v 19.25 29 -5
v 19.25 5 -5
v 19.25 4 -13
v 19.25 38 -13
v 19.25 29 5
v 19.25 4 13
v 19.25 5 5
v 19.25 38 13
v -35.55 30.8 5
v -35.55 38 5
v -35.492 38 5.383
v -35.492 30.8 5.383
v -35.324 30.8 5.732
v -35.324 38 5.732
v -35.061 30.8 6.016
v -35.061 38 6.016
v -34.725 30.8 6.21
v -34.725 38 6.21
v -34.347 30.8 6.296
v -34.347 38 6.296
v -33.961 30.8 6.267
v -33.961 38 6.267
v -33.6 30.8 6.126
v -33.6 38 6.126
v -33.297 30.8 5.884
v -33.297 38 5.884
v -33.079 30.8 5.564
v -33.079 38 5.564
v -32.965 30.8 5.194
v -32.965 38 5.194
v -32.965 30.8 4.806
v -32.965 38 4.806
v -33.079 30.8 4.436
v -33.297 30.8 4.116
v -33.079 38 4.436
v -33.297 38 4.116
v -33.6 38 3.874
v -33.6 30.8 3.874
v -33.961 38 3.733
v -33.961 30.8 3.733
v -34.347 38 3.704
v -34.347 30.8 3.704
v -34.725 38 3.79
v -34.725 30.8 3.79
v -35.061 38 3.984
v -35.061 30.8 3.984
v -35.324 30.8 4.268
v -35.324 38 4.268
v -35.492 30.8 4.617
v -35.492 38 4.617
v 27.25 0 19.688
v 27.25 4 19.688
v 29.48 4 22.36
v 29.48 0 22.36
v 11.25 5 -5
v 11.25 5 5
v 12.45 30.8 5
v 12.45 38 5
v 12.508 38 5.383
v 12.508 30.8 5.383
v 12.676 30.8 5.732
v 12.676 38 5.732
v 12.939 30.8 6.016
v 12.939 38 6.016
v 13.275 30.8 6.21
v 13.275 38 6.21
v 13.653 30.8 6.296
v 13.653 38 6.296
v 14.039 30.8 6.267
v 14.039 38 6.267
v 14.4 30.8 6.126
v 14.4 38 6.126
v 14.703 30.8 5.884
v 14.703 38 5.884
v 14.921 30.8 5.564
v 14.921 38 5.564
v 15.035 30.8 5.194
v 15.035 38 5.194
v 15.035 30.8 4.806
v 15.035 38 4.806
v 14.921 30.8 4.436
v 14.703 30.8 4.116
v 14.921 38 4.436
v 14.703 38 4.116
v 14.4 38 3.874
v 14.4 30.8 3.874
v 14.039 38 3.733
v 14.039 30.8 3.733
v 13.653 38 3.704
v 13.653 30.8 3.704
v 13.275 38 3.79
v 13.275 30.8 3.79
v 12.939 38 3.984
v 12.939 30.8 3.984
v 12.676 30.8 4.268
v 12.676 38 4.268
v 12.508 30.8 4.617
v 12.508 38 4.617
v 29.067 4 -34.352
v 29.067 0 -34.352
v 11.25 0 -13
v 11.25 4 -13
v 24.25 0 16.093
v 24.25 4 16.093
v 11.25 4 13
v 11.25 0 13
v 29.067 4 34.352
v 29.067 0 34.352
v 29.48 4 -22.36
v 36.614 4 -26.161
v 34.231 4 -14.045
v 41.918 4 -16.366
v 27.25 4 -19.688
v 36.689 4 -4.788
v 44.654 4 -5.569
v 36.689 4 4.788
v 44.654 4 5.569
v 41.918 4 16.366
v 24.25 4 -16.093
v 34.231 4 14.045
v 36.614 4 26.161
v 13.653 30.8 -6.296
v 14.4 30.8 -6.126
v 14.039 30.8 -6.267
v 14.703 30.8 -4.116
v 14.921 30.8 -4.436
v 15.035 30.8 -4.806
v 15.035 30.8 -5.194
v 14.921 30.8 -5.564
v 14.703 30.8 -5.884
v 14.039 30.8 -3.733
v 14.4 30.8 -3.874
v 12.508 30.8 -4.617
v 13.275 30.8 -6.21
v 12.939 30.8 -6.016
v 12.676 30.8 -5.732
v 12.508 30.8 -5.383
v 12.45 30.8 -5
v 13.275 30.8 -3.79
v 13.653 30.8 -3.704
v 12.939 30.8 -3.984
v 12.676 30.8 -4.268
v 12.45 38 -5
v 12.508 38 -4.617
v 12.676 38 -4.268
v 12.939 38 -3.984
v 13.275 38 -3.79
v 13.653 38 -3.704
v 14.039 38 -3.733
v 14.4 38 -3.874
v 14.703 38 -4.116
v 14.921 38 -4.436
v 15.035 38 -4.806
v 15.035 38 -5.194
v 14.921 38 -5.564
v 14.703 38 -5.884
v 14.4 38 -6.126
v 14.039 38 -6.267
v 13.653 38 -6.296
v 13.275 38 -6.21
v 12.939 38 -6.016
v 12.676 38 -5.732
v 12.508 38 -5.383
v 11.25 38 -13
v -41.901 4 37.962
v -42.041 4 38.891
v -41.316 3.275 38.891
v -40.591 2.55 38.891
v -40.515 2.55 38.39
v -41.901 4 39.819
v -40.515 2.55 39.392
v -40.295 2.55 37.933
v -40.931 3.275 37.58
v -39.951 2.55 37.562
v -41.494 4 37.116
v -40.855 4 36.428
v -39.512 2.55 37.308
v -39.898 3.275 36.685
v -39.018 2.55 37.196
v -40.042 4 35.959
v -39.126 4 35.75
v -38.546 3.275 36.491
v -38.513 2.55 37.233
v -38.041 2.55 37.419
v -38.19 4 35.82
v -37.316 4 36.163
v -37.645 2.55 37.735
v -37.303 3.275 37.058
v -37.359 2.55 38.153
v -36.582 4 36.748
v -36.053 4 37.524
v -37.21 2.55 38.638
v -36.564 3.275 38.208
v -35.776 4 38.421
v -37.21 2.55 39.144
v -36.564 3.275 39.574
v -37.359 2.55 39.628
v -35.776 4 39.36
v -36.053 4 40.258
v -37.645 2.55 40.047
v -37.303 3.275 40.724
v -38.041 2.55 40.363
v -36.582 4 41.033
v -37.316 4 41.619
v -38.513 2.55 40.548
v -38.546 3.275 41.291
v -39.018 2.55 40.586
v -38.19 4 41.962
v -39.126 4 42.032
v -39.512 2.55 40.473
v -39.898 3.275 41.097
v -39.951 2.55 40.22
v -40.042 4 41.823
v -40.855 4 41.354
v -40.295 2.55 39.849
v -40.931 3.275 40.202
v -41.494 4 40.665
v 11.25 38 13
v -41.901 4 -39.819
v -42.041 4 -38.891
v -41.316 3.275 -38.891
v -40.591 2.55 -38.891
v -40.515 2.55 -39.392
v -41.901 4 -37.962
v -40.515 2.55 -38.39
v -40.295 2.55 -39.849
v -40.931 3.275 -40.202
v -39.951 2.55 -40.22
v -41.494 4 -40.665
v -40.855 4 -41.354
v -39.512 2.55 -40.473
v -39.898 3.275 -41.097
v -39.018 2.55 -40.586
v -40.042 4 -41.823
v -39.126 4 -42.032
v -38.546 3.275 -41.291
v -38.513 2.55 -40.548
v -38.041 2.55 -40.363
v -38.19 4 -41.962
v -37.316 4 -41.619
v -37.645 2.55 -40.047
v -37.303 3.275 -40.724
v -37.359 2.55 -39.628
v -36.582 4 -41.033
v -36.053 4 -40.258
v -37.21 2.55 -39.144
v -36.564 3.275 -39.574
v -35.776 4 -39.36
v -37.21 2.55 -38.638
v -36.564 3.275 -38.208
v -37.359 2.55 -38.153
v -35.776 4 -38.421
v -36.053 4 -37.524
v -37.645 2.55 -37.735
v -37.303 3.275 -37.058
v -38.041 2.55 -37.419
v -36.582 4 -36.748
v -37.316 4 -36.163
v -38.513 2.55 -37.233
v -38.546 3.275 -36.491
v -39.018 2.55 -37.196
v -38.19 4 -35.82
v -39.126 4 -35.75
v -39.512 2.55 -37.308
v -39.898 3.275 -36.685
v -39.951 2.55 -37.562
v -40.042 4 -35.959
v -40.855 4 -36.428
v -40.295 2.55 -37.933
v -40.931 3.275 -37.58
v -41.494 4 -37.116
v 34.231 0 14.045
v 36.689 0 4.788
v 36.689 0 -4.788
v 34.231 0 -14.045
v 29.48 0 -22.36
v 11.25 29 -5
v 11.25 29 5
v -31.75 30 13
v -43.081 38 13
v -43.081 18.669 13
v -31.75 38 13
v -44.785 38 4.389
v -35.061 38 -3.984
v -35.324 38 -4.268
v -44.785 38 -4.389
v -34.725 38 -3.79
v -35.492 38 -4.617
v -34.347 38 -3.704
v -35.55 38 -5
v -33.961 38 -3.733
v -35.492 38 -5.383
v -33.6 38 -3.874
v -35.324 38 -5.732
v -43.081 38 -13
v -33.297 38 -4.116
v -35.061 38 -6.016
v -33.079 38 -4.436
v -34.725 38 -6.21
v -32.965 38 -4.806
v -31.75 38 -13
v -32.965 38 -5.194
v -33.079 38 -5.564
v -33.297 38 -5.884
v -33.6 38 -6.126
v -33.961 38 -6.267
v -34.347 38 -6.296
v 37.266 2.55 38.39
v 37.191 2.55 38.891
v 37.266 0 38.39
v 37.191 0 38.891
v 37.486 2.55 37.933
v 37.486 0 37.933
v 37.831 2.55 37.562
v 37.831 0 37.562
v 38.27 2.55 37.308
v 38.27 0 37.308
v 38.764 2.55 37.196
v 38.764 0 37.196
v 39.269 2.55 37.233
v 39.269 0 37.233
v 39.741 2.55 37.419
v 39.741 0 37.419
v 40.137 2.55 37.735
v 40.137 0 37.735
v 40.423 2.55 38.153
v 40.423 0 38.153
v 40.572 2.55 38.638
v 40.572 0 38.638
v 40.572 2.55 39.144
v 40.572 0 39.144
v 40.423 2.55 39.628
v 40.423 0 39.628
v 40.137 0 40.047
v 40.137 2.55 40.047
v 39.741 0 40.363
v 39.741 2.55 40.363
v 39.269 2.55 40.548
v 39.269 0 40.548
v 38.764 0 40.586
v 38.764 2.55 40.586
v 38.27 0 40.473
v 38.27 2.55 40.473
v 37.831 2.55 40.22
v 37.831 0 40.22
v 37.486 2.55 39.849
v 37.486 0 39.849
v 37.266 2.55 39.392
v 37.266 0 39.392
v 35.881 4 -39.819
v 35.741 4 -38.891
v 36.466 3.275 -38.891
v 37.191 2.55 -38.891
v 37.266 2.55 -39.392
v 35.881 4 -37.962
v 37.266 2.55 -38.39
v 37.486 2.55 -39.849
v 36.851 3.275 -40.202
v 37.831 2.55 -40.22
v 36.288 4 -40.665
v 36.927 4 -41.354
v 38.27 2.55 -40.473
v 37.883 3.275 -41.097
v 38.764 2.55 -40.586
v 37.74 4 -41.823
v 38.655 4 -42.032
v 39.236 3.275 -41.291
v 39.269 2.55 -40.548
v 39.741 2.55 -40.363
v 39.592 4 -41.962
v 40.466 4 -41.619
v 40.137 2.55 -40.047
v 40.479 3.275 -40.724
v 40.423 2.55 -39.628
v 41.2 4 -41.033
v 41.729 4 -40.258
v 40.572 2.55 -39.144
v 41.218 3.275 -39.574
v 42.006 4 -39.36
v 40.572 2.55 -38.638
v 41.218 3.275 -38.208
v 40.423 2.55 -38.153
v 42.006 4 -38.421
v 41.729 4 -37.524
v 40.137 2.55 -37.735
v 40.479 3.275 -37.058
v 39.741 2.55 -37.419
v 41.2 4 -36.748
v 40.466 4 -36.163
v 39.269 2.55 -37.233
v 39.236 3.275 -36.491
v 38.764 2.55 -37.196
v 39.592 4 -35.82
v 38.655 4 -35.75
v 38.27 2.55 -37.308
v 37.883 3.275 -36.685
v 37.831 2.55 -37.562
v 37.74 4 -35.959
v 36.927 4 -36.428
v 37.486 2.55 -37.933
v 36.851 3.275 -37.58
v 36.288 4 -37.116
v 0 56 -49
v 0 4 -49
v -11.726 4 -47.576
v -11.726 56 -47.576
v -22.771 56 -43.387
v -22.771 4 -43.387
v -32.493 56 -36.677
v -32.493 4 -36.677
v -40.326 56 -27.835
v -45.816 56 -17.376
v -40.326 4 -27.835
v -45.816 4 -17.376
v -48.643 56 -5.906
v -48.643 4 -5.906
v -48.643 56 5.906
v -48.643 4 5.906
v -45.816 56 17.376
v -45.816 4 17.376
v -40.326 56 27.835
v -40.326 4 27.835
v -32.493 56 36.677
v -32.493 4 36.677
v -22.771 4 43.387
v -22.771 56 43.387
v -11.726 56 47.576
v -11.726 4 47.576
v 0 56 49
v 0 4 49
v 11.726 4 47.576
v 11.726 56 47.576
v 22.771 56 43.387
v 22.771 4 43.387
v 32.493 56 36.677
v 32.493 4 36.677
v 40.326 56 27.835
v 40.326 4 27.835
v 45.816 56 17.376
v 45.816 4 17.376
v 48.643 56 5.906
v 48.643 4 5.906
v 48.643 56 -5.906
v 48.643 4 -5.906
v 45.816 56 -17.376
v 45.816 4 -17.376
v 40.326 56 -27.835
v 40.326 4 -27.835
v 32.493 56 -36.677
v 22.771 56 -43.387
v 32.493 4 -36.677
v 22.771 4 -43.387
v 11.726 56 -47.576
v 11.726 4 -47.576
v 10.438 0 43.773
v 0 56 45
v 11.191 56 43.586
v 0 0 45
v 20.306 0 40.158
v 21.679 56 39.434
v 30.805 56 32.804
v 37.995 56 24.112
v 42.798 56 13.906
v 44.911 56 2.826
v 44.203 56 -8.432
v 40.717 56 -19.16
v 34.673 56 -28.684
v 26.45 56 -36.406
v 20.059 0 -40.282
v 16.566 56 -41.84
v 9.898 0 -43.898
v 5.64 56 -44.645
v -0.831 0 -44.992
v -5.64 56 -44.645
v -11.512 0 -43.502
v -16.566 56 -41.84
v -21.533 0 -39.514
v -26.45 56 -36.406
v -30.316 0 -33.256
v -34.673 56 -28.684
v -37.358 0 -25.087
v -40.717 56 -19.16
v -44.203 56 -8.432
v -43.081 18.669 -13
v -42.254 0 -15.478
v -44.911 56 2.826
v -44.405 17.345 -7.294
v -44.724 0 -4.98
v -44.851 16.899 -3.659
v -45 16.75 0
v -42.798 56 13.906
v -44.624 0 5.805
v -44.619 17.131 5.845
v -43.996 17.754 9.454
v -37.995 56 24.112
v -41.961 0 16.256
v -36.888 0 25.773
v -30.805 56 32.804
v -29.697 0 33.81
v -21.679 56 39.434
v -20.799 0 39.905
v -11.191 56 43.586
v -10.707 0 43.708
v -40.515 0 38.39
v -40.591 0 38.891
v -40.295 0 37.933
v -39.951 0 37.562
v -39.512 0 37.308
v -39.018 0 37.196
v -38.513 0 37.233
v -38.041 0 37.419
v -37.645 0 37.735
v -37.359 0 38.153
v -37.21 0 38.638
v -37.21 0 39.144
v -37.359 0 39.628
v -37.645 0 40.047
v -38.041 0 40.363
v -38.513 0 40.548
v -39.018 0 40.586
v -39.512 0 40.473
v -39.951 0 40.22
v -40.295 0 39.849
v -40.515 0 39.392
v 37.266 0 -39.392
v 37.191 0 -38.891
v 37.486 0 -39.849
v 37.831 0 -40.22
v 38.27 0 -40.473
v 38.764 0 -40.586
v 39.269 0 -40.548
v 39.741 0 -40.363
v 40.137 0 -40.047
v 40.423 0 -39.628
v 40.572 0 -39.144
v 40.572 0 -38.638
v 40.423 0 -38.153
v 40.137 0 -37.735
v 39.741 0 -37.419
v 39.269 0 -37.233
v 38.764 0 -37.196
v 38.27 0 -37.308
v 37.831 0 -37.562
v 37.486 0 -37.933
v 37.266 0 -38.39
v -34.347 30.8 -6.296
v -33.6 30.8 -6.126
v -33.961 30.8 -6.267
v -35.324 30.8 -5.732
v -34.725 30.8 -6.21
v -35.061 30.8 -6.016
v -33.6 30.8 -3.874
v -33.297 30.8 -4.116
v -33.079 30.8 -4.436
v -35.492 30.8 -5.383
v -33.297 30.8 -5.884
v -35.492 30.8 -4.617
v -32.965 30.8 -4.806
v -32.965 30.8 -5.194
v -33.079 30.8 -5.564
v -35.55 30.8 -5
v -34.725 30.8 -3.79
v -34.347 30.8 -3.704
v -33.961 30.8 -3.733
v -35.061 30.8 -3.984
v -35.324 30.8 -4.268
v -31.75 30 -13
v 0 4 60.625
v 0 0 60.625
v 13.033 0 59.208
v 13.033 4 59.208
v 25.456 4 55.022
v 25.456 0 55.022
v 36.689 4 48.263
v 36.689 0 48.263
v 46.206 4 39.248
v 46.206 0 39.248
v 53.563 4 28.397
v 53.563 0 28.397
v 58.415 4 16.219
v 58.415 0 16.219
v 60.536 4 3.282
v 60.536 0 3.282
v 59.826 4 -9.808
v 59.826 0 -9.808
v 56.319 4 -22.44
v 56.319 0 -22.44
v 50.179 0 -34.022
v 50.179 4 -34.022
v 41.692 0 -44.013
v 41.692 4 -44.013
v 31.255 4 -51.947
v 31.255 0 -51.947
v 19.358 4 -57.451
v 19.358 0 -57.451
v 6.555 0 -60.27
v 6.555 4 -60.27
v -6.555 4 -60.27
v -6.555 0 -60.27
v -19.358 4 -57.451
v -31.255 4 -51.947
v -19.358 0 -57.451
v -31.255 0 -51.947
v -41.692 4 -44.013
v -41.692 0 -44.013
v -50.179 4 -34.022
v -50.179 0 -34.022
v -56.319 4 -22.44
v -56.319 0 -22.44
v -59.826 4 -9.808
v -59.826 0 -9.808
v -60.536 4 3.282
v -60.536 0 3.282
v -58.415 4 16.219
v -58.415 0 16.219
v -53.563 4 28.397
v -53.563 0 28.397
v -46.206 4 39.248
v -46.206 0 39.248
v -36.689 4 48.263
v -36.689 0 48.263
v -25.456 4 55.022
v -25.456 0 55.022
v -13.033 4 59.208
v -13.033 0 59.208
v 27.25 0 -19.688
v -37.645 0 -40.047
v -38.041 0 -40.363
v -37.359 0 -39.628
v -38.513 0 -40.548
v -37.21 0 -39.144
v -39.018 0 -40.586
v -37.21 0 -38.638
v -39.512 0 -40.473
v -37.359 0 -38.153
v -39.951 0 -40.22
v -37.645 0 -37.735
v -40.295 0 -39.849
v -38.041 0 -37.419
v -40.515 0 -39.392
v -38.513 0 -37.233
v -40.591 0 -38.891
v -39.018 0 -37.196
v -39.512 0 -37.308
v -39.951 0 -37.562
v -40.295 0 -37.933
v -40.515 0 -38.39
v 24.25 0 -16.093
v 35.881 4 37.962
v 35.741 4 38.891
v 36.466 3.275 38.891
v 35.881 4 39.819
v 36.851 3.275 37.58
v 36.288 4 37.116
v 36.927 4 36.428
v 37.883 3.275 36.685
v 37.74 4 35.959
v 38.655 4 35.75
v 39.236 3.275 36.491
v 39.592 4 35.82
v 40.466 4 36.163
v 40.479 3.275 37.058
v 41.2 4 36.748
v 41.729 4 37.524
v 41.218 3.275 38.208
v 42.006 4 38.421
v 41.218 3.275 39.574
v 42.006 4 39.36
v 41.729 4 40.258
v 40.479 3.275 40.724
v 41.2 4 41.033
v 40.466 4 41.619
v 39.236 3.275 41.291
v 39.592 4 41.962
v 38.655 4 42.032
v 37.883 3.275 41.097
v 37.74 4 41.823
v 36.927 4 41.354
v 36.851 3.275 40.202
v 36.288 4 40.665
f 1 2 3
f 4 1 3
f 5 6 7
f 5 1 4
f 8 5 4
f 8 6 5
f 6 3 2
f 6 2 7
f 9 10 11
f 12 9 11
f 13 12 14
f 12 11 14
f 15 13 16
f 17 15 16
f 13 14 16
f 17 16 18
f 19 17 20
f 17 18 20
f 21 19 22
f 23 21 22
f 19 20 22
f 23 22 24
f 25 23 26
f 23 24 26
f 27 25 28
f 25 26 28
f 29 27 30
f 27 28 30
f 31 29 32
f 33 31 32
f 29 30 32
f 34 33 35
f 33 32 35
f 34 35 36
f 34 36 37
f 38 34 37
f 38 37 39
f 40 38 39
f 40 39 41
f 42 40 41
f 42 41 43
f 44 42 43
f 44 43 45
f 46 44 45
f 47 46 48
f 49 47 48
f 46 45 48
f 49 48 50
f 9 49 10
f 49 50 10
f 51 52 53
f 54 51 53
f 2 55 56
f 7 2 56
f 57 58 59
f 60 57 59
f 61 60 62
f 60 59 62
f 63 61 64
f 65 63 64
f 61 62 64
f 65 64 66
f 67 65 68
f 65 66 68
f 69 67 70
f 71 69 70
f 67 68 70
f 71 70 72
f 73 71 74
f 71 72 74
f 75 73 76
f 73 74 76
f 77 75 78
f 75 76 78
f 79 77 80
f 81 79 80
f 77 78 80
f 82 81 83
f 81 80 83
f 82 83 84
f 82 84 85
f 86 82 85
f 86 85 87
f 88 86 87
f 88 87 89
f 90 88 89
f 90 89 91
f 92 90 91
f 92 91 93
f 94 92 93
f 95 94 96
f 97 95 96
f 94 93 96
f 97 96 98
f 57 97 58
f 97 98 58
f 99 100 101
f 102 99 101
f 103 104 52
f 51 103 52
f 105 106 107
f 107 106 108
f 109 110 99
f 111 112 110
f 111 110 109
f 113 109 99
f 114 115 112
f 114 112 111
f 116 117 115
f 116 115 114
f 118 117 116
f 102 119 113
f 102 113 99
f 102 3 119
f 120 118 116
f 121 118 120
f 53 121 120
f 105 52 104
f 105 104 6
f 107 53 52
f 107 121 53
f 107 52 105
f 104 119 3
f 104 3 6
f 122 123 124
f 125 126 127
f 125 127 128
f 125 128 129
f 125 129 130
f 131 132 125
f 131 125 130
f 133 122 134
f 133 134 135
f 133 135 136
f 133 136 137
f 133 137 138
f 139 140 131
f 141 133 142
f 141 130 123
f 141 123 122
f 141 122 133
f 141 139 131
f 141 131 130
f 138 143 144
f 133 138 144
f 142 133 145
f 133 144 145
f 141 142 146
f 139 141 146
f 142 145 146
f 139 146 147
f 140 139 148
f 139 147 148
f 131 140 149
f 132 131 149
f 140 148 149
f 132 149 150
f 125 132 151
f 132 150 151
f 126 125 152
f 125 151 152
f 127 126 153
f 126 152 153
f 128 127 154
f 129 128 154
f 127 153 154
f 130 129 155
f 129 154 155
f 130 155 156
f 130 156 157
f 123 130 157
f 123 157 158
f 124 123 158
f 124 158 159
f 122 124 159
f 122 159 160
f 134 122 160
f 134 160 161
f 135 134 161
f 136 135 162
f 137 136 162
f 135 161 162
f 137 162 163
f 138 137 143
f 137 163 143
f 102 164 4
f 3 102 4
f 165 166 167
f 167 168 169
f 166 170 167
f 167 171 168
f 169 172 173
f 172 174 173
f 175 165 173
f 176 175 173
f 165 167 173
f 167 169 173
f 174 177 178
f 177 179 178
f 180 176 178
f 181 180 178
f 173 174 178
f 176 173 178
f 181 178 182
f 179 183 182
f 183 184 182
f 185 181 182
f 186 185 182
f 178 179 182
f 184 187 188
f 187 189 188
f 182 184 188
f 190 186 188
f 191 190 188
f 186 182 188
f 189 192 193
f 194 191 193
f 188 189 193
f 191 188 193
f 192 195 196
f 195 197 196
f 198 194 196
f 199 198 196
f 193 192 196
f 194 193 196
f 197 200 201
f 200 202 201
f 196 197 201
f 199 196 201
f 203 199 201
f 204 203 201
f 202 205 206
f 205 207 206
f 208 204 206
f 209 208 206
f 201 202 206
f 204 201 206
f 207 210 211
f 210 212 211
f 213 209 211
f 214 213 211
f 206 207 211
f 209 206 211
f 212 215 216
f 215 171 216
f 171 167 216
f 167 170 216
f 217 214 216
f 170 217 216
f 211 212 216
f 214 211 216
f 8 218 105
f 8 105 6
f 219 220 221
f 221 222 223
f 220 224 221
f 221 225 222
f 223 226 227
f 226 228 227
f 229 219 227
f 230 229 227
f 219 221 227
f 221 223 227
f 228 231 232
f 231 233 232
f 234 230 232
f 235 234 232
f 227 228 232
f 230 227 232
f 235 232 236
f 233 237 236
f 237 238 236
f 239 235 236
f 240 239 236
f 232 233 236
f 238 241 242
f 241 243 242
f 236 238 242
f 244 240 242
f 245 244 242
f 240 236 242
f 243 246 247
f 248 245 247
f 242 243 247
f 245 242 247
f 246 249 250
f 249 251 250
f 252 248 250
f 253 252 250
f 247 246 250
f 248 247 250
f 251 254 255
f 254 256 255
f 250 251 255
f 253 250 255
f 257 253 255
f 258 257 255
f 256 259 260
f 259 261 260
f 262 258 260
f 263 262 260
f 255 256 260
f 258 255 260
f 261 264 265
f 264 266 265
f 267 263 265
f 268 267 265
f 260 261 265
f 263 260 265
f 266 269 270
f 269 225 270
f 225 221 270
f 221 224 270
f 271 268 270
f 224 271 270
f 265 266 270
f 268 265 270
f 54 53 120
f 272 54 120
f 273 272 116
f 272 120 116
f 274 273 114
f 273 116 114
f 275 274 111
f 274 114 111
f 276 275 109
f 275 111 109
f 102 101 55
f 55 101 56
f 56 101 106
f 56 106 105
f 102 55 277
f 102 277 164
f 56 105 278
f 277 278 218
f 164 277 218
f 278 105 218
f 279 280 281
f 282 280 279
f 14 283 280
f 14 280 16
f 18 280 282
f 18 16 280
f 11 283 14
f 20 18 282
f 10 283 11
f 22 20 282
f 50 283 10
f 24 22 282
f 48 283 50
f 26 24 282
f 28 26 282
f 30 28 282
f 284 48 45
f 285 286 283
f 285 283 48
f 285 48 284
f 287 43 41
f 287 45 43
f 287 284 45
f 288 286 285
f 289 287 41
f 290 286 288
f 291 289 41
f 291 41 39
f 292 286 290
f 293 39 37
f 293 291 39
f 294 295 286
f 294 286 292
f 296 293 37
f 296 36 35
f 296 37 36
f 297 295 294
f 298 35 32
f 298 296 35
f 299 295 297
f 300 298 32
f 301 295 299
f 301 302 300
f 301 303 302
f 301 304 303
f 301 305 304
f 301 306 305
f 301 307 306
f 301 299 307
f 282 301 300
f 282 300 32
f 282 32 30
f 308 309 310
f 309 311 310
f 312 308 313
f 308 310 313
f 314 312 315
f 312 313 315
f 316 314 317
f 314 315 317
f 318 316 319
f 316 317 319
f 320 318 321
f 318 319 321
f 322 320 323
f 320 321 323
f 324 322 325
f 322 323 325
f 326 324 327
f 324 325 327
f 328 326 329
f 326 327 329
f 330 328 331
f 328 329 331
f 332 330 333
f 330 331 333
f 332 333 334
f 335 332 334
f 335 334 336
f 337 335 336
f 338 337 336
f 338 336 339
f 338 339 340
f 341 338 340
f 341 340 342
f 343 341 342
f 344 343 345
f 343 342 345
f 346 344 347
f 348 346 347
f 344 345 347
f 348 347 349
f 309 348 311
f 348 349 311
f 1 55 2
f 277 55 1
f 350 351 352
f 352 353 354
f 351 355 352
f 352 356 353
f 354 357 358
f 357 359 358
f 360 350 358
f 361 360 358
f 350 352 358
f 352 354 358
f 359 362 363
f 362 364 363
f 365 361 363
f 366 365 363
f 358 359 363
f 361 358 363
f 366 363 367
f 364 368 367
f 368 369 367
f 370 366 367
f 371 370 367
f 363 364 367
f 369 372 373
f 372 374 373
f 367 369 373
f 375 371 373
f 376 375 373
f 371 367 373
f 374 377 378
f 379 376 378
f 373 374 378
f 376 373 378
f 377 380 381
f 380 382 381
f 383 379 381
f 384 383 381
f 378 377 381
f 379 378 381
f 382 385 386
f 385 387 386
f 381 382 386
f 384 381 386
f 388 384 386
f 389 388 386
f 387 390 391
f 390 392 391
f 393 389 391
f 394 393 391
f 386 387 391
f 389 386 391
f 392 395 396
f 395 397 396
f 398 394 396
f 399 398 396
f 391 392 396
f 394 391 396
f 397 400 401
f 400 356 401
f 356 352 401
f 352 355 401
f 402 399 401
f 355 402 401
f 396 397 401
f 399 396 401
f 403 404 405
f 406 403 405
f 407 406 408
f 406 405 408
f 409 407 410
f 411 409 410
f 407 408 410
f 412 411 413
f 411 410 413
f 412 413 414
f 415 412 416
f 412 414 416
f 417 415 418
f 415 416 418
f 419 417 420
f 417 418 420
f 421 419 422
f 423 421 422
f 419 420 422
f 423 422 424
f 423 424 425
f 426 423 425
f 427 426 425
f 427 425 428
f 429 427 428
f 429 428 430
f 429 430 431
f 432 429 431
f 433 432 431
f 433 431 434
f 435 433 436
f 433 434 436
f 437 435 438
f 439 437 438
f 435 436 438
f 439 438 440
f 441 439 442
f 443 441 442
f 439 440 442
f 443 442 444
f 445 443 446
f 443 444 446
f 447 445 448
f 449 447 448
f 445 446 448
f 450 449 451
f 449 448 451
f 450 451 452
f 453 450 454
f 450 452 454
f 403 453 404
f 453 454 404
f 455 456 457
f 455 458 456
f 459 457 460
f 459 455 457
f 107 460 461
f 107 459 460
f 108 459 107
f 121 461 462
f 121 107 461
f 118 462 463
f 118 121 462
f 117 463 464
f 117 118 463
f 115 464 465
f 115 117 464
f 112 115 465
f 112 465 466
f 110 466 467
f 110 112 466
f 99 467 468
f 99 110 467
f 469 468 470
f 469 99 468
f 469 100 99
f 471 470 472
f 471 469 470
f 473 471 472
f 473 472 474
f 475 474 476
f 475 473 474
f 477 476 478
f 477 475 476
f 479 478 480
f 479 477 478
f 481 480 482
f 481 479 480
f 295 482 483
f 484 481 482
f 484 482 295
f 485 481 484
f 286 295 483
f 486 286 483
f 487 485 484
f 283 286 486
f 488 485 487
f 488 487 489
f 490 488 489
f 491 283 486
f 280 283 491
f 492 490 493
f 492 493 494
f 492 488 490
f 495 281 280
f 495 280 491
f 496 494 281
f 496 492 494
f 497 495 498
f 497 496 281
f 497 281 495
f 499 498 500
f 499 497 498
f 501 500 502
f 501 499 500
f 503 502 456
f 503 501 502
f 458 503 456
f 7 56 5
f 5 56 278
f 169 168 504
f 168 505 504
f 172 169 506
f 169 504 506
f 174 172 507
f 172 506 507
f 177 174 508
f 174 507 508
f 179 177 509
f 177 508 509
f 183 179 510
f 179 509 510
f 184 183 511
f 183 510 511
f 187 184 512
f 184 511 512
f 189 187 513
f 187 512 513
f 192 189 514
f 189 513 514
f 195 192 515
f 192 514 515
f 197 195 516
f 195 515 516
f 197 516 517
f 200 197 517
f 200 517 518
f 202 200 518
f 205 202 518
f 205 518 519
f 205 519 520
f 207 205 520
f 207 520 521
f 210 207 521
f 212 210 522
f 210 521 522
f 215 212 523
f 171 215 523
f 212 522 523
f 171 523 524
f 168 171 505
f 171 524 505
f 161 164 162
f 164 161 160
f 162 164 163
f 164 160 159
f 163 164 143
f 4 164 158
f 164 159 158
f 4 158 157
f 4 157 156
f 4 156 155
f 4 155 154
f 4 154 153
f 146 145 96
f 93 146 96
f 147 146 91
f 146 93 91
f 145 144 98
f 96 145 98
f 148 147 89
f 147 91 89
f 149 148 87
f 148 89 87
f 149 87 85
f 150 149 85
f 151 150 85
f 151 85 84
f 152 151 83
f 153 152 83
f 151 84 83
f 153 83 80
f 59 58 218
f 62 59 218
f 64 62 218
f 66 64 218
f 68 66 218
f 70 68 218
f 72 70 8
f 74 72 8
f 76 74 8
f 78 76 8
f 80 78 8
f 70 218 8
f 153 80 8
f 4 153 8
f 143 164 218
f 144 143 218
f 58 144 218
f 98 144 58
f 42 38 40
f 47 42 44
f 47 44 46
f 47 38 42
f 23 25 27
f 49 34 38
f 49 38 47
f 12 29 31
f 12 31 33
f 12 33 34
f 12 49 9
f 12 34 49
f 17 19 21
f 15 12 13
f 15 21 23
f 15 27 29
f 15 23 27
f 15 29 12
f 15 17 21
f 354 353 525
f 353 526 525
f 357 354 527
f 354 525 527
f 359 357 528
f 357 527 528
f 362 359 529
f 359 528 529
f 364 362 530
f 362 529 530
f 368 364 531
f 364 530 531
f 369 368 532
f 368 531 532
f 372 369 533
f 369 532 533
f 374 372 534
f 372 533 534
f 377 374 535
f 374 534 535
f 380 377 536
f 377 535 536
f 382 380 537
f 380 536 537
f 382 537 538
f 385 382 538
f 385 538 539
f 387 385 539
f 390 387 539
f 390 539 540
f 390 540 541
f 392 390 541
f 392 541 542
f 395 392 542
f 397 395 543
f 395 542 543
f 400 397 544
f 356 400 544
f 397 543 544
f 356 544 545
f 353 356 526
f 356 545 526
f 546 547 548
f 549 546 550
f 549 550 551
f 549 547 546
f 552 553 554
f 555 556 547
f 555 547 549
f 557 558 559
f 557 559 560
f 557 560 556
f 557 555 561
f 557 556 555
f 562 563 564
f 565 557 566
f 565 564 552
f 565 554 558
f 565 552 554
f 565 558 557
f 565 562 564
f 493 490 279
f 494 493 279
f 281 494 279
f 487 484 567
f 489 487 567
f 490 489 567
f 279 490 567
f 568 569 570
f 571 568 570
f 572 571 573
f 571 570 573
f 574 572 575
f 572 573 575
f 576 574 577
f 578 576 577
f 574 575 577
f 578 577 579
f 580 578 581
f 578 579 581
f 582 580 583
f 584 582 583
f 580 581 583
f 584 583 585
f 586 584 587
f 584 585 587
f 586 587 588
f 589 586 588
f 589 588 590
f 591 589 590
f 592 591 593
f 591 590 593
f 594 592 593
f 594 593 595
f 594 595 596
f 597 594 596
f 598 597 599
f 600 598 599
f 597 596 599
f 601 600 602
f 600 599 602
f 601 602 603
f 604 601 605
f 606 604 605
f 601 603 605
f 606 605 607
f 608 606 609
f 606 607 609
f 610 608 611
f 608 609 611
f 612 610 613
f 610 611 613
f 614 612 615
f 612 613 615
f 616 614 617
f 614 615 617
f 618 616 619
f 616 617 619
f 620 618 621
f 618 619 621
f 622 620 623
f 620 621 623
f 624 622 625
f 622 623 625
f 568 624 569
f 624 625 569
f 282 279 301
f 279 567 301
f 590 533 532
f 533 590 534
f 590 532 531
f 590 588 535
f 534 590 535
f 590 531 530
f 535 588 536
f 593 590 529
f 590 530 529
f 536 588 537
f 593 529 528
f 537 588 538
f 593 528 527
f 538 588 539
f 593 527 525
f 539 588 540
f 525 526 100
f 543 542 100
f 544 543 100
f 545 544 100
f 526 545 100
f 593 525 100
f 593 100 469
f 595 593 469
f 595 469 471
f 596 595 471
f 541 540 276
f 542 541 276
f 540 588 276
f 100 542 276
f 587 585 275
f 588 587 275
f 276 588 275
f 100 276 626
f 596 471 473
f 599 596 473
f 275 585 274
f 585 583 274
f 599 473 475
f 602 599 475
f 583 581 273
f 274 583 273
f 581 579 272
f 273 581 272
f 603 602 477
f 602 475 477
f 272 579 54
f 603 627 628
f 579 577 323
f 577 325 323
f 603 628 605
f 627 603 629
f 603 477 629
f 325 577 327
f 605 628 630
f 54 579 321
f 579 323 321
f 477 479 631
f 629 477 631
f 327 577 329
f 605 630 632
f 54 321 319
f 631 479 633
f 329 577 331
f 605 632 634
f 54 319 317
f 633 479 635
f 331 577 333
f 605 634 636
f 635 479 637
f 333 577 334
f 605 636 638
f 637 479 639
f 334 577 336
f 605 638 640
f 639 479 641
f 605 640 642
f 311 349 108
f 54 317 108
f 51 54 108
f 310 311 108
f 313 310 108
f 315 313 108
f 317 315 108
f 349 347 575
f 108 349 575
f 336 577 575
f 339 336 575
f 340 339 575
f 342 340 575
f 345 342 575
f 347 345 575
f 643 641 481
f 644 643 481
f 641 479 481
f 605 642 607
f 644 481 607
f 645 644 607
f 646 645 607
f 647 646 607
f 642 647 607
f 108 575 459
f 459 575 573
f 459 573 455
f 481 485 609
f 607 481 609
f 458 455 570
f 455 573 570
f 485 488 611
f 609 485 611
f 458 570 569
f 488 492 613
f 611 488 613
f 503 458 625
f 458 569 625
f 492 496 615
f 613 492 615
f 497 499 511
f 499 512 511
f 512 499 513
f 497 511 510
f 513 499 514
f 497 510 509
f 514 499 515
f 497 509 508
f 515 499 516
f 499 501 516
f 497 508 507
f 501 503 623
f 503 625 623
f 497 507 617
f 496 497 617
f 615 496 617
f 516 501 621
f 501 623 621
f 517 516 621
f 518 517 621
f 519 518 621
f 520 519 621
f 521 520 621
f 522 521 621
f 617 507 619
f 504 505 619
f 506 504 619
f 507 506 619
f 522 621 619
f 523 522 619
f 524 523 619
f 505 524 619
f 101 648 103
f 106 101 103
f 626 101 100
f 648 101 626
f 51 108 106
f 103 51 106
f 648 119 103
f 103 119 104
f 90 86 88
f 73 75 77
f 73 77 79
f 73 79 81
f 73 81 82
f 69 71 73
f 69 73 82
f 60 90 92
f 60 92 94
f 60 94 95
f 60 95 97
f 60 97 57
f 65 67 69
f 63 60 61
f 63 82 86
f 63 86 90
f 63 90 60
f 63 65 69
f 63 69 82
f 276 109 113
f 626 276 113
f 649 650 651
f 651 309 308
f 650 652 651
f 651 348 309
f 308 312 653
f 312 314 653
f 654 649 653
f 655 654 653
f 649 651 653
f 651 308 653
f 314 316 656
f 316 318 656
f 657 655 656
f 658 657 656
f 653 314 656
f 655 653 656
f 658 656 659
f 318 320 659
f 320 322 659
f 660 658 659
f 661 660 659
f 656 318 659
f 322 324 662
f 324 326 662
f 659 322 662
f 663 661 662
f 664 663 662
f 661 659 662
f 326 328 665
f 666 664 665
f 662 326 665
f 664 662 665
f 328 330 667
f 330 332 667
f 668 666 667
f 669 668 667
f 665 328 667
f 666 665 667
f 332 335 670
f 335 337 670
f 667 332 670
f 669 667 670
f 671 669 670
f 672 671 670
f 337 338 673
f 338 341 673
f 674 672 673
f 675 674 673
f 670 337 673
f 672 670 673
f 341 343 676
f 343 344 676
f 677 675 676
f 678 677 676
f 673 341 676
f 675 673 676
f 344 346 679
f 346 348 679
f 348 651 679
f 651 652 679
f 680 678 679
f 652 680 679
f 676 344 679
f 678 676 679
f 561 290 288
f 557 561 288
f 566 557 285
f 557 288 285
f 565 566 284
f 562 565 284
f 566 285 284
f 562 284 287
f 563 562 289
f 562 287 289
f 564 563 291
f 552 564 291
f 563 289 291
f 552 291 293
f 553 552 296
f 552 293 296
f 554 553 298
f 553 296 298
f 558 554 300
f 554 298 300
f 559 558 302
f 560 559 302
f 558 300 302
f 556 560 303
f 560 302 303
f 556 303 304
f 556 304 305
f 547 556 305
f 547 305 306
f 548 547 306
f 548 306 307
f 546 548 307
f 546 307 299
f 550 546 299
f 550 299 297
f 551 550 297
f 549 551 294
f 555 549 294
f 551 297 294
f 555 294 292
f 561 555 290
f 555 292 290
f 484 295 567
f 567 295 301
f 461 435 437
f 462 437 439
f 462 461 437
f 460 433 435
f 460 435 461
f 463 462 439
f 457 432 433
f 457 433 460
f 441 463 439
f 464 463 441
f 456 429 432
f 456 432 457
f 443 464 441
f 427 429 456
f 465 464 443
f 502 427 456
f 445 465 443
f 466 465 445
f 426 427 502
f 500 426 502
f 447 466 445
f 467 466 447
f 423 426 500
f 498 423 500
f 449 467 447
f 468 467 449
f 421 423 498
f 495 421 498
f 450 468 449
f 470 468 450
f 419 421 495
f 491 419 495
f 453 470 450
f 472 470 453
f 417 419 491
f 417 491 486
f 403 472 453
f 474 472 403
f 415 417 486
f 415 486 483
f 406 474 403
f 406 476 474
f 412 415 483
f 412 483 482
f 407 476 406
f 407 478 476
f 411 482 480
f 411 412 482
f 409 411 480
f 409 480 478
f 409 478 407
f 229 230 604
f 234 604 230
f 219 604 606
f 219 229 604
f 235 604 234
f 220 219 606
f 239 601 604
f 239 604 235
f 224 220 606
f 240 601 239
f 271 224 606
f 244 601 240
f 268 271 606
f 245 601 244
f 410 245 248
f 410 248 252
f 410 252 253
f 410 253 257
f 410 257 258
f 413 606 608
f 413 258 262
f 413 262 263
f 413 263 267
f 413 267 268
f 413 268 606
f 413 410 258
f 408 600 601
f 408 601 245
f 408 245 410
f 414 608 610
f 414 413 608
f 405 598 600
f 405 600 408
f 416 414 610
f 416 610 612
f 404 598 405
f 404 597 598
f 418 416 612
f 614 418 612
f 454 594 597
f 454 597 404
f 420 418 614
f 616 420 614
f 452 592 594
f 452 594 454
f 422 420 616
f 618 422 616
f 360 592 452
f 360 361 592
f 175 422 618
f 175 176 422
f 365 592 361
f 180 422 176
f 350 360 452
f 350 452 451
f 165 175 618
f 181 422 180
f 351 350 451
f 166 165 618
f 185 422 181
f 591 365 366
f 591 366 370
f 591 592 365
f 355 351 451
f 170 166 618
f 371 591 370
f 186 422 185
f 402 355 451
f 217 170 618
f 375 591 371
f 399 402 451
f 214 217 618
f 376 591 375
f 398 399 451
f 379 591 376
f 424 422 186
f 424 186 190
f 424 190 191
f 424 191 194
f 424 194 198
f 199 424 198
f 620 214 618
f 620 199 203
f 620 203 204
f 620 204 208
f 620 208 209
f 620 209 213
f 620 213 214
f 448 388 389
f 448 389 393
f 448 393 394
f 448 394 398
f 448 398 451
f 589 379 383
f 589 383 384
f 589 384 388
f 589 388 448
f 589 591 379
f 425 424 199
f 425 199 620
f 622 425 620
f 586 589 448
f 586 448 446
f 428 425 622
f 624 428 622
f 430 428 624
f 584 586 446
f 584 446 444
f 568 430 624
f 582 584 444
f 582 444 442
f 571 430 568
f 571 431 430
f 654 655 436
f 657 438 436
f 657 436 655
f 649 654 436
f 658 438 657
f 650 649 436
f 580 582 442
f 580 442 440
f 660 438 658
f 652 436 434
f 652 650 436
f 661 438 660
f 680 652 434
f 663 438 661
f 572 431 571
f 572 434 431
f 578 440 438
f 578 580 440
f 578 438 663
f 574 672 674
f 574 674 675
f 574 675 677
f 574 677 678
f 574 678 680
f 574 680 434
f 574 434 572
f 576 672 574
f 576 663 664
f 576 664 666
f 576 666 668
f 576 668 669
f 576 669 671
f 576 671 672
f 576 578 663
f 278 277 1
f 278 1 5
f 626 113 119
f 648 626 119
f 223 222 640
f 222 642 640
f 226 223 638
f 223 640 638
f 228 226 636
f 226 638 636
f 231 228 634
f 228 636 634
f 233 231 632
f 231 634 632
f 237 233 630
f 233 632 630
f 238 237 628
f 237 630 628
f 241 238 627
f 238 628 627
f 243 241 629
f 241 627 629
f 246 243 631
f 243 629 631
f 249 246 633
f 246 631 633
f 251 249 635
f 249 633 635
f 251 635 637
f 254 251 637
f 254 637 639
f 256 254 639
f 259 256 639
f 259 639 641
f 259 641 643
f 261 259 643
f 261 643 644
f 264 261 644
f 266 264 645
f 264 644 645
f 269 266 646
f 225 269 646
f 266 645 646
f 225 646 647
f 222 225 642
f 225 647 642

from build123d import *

# Parameters (mm, degrees)
SKETCH1_R                                           = 60.625
SKETCH1_R_2                                         = 45
BOSS_EXTRUDE1_DEPTH                                 = 4
SKETCH2_R                                           = 49
SKETCH2_R_2                                         = 45
BOSS_EXTRUDE2_DEPTH                                 = 52
SKETCH4_W                                           = 13.25
SKETCH4_H                                           = 8
SKETCH4_W_2                                         = 8
SKETCH4_H_2                                         = 38
BOSS_EXTRUDE4_DEPTH                                 = 13
BOSS_EXTRUDE5_DEPTH                                 = 4
SKETCH7_R                                           = 1.3
CUT_EXTRUDE4_DEPTH                                  = 7.2
SKETCH9_W                                           = 10
SKETCH9_H                                           = 24
CUT_EXTRUDE7_DEPTH                                  = 8
CUT_EXTRUDE9_DEPTH                                  = 101.273532151
CSK_FOR_M3_COUNTERSUNK_FLAT_HEAD_SCREW1_D           = 3.4
CSK_FOR_M3_COUNTERSUNK_FLAT_HEAD_SCREW1_CSINK_D     = 6.3
CSK_FOR_M3_COUNTERSUNK_FLAT_HEAD_SCREW1_CSINK_ANGLE = 90


with BuildPart() as part:
    # Sketch1 → Boss-Extrude1 (new body)
    with BuildSketch(Plane(origin=(0, 0, 0), x_dir=(1, 0, 0), z_dir=(0, 1, 0))):
        with Locations(Location((0, 0, 0), (0, 0, 270))):
            Circle(SKETCH1_R)
        with Locations(Location((0, 0, 0), (0, 0, 270))):
            Circle(SKETCH1_R_2, mode=Mode.SUBTRACT)
    extrude(amount=BOSS_EXTRUDE1_DEPTH)

    # Sketch2 → Boss-Extrude2 (add)
    with BuildSketch(Plane(origin=(0, 4, 0), x_dir=(1, 0, 0), z_dir=(0, 1, 0))):
        with Locations(Location((0, 0, 0), (0, 0, 90))):
            Circle(SKETCH2_R)
        with Locations(Location((0, 0, 0), (0, 0, 270))):
            Circle(SKETCH2_R_2, mode=Mode.SUBTRACT)
    extrude(amount=BOSS_EXTRUDE2_DEPTH)

    # Sketch4 → Boss-Extrude4 (add, symmetric)
    with BuildSketch(Plane.XY):
        with Locations((-38.375, 34)):
            Rectangle(SKETCH4_W, SKETCH4_H)
        Polygon((-31.75, 30), (-45, 30), (-45, 16.75), align=None)
        with Locations((15.25, 19)):
            Rectangle(SKETCH4_W_2, SKETCH4_H_2)
    extrude(amount=BOSS_EXTRUDE4_DEPTH, both=True)


with BuildPart() as boss_extrude4_piece_1:
    # of the separate pieces the step leaves, piece 1, a body of its own (boss_extrude4_pieces)
    add(part.part.solids().sort_by_distance((0, 0, 60.625))[0])



with BuildPart() as boss_extrude4_piece_2:
    # of the separate pieces the step leaves, piece 2, a body of its own (boss_extrude4_pieces)
    add(part.part.solids().sort_by_distance((11.25, 38, -13))[0])


with BuildPart() as boss_extrude4_piece_1_1:
    add(boss_extrude4_piece_1.part)

    add(boss_extrude4_piece_2.part)  # Boss-Extrude5 merges Boss-Extrude4 piece 2
    # Sketch5 → Boss-Extrude5 (add)
    with BuildSketch(Plane.XZ):
        with BuildLine():
            Line((11.25, 13), (29.067400866, 34.352382842))
            ThreePointArc((29.067400866, 34.352382842), (45, 0), (29.067400866, -34.352382842))
            Line((29.067400866, -34.352382842), (11.25, -13))
            Line((11.25, -13), (11.25, 13))
        make_face()
    extrude(amount=-BOSS_EXTRUDE5_DEPTH)

    # Sketch7 → Cut-Extrude4 (cut)
    with BuildSketch(Plane(origin=(0, 38, 0), x_dir=(1, 0, 0), z_dir=(0, 1, 0))):
        with Locations(Location((-34.25, 5, 0), (0, 0, 180))):
            Circle(SKETCH7_R)
        with Locations(Location((-34.25, -5, 0), (0, 0, 180))):
            Circle(SKETCH7_R)
        with Locations(Location((13.75, 5, 0), (0, 0, 180))):
            Circle(SKETCH7_R)
        with Locations(Location((13.75, -5, 0), (0, 0, 180))):
            Circle(SKETCH7_R)
    extrude(amount=-CUT_EXTRUDE4_DEPTH, mode=Mode.SUBTRACT)

    # Sketch9 → Cut-Extrude7 (cut)
    with BuildSketch(Plane.ZY.offset(-11.25)):
        with Locations((0, 17)):
            Rectangle(SKETCH9_W, SKETCH9_H)
    extrude(amount=-CUT_EXTRUDE7_DEPTH, mode=Mode.SUBTRACT)

    # Sketch12 → Cut-Extrude9 (cut, through all)
    with BuildSketch(Plane(origin=(0, 4, 0), x_dir=(1, 0, 0), z_dir=(0, 1, 0))):
        with BuildLine():
            Line((29.479537487, 22.359715328), (27.25, 19.687836398))
            Line((27.25, 19.687836398), (27.25, -19.687836398))
            Line((27.25, -19.687836398), (29.479537487, -22.359715328))
            ThreePointArc((29.479537487, -22.359715328), (37, 0), (29.479537487, 22.359715328))
        make_face()
        Polygon((27.25, -19.687836398), (27.25, 19.687836398), (24.25, 16.092634774), (24.25, -16.092634774), align=None)
    extrude(amount=-CUT_EXTRUDE9_DEPTH, mode=Mode.SUBTRACT)

    # CSK for M3 Countersunk Flat Head Screw1 (through all)
    with Locations(Plane(origin=(0, 4, 0), x_dir=(1, 0, 0), z_dir=(0, 1, 0))):
        with Locations((-38.890872965, 38.890872965), (-38.890872965, -38.890872965), (38.890872965, -38.890872965), (38.890872965, 38.890872965)):
            CounterSinkHole(CSK_FOR_M3_COUNTERSUNK_FLAT_HEAD_SCREW1_D / 2, CSK_FOR_M3_COUNTERSUNK_FLAT_HEAD_SCREW1_CSINK_D / 2, counter_sink_angle=CSK_FOR_M3_COUNTERSUNK_FLAT_HEAD_SCREW1_CSINK_ANGLE)


solid = boss_extrude4_piece_1_1.part
